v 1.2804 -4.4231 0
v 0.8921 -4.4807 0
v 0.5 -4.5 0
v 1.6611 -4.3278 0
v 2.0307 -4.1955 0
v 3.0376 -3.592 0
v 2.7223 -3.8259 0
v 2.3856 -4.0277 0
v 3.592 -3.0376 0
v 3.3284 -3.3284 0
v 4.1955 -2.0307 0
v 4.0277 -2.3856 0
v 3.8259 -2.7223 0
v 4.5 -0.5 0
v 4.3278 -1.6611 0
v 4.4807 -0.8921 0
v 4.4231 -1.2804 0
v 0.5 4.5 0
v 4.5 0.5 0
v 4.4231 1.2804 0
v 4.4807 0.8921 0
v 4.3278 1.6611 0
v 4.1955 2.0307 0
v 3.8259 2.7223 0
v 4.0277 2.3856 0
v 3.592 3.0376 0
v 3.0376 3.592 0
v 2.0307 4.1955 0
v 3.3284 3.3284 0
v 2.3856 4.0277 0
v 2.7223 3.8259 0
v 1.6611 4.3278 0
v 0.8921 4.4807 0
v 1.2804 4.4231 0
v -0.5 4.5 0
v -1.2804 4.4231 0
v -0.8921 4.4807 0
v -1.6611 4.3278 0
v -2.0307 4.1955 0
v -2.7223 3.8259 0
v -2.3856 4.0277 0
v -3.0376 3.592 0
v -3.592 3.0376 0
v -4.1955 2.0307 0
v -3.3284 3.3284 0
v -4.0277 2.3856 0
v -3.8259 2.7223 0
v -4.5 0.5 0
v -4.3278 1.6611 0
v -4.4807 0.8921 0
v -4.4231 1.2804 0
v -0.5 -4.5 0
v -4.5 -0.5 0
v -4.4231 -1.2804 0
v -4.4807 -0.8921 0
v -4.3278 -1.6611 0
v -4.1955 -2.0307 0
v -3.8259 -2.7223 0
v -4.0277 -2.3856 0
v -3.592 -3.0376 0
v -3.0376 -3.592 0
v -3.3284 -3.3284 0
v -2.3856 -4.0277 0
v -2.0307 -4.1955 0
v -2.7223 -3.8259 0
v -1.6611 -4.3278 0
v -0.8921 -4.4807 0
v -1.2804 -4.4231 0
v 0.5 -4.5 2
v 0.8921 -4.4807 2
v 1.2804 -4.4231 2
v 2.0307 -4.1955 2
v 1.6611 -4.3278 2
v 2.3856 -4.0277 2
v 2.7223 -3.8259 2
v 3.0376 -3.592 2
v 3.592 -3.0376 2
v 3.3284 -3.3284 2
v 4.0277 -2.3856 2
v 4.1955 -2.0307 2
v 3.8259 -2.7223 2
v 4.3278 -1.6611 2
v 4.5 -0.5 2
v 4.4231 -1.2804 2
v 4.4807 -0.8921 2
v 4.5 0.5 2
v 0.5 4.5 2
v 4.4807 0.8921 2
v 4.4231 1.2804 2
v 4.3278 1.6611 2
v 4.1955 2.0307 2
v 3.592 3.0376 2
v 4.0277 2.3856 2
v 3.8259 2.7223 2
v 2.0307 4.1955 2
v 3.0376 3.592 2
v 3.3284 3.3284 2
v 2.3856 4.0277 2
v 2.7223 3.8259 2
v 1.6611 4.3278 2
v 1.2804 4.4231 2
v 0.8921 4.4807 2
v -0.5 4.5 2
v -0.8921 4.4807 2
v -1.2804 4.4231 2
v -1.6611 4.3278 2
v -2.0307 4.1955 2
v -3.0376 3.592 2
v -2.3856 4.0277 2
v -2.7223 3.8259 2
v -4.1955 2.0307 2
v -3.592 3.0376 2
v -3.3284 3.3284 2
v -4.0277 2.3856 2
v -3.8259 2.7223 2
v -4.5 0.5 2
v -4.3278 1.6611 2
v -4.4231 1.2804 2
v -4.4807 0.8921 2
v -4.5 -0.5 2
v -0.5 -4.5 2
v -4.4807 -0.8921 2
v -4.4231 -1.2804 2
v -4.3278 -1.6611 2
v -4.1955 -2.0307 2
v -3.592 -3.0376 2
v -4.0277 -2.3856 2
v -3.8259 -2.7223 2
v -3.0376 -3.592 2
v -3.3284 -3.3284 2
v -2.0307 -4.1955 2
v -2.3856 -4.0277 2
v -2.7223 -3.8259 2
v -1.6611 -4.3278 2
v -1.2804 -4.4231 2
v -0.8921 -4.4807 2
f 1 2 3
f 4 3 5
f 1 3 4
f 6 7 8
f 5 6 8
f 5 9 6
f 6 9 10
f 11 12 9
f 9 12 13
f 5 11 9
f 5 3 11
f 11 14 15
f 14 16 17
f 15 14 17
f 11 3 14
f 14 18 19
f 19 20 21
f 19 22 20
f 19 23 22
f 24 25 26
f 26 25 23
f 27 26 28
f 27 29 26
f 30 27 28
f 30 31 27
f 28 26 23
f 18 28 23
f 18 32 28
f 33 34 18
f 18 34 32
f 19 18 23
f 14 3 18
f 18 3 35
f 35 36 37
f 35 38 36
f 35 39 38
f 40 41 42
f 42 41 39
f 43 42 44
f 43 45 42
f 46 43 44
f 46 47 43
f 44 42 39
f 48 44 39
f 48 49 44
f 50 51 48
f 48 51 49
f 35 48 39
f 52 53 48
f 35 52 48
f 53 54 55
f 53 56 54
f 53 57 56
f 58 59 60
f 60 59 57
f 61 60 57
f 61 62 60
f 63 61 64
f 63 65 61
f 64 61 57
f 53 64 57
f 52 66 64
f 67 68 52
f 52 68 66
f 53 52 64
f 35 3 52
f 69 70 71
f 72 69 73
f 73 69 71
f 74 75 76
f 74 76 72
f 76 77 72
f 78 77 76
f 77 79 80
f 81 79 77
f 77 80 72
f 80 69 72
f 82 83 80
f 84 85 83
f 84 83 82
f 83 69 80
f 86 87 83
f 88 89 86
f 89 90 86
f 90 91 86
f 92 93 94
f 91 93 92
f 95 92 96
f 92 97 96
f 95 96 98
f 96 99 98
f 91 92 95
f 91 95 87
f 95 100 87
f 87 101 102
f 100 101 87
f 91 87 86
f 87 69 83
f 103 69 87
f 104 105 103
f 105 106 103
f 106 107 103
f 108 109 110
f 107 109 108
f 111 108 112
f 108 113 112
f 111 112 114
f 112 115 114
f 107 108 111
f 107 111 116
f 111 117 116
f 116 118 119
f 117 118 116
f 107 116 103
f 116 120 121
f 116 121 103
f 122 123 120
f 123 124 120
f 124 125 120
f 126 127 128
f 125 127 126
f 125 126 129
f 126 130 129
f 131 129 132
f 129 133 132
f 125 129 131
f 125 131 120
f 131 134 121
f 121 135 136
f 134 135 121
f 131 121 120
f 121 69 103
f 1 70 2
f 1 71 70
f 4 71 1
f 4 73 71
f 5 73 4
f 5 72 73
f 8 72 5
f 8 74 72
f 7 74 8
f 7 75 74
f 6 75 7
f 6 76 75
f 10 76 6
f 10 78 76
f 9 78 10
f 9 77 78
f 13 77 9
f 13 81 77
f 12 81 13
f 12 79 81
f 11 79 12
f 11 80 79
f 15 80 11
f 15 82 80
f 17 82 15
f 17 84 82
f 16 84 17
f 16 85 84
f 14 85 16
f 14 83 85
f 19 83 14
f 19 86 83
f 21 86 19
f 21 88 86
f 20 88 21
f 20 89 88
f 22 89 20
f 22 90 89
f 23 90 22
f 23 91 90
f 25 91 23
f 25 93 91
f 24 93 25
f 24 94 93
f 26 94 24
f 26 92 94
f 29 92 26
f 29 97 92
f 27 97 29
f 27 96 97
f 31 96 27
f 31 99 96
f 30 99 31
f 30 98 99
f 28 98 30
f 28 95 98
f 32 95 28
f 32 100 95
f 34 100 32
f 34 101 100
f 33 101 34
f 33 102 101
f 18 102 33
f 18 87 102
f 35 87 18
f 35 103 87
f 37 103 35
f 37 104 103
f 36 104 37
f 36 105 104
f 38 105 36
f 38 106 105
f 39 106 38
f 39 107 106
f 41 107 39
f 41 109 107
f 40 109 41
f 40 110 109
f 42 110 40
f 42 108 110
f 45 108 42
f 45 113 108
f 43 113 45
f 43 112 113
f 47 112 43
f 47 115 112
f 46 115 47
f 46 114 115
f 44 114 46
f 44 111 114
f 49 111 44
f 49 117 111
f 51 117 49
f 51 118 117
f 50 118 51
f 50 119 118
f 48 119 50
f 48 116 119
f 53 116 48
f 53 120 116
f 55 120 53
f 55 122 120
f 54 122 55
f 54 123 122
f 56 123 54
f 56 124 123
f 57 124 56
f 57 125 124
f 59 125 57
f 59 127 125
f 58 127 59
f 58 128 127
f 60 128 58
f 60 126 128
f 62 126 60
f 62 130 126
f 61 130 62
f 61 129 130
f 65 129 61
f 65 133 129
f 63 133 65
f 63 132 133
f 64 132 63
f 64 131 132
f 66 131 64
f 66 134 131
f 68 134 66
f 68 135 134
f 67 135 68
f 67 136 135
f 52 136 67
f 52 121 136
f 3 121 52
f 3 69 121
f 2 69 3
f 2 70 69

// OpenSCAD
// file: lib/logo_plaque.scad
// Raised multi-color logo on a rounded base.
//
//   side view
//
//        ▄▄▄  ▒▒▒▒   ░░    ← logo layers, one per filament
//   ▐████████████████████▌ ← base
//
// Every layer SVG shares one pixel frame, so the layers line up without
// centering each one (centering would use each layer's own outline).

$fn = 64;

BASE_HEIGHT = 2;
LOGO_HEIGHT = 1.2;
BORDER = 3;
CORNER_RADIUS = 4;
AVATAR_FN = 180;
MARK_HEIGHT = 4;
TIE_HEIGHT = 1.2;

// potrace writes one point per pixel, and OpenSCAD reads points as 1/72 inch
MM_PER_FRAME_PX = 25.4 / 72;

module layer_2d(dir, name, frame, width) {
    scale(width / (frame.x * MM_PER_FRAME_PX))
        translate([-frame.x / 2, -frame.y / 2] * MM_PER_FRAME_PX)
            import(str(dir, "/", name, ".svg"));
}

// Earlier layers win where traced outlines overlap, so no two parts share volume.
module clipped_layer_2d(dir, layers, index, frame, width) {
    difference() {
        layer_2d(dir, layers[index][0], frame, width);

        for (earlier = [0:1:index - 1]) {
            layer_2d(dir, layers[earlier][0], frame, width);
        }
    }
}

module rounded_base_2d(frame, width, border, corner_radius) {
    height = width * frame.y / frame.x;

    offset(r = corner_radius)
        square(
            [
                width + (border - corner_radius) * 2,
                height + (border - corner_radius) * 2,
            ],
            center = true
        );
}

// `part` selects one filament for export: "base", a layer name, or "all".
// With `diameter`, the base is a circle instead of a rounded rectangle.
module logo_plaque(
    dir,
    frame,
    width,
    base_color,
    layers,
    part = "all",
    base_height = BASE_HEIGHT,
    logo_height = LOGO_HEIGHT,
    border = BORDER,
    corner_radius = CORNER_RADIUS,
    diameter = undef
) {
    if (part == "all" || part == "base") {
        color(base_color)
            linear_extrude(height = base_height)
                if (is_undef(diameter)) {
                    rounded_base_2d(frame, width, border, corner_radius);
                } else {
                    circle(d = diameter, $fn = AVATAR_FN);
                }
    }

    for (index = [0:1:len(layers) - 1]) {
        if (part == "all" || part == layers[index][0]) {
            color(layers[index][1])
                translate([0, 0, base_height])
                    linear_extrude(height = logo_height)
                        clipped_layer_2d(dir, layers, index, frame, width);
        }
    }
}

// The logo extruded with no base.
//
//   side view
//
//   ████  ████   ▒▒▒▒ ← layers at full height
//   ████▁▁████▁▁▁▒▒▒▒ ← low ties join loose pieces
//
// Each layer is [name, color, has_ties]. Ties are in "<name>_ties.svg", and stop
// at other layers so that no two parts share volume.
//
// With `back_color`, one more filament joins the pieces. The ties, in "ties.svg",
// and the logo's outline form a back layer, and the logo sits on top of it:
//
//   ████  ████   ▒▒▒▒
//   ▄▄▄▄▄▄▄▄▄▄▄▄▄▄▄▄▄ ← back layer, `tie_height` thick
//
// `part` selects one filament for export: "back", a layer name, or "all".
module logo_mark(
    dir,
    frame,
    width,
    layers,
    part = "all",
    height = MARK_HEIGHT,
    tie_height = TIE_HEIGHT,
    back_color = undef,
    back_has_ties = false
) {
    has_back = !is_undef(back_color);
    logo_z = has_back ? tie_height : 0;

    if (has_back && (part == "all" || part == "back")) {
        color(back_color)
            linear_extrude(height = tie_height) {
                for (layer = layers) {
                    layer_2d(dir, layer[0], frame, width);
                }

                if (back_has_ties) {
                    layer_2d(dir, "ties", frame, width);
                }
            }
    }

    for (index = [0:1:len(layers) - 1]) {
        name = layers[index][0];

        if (part == "all" || part == name) {
            color(layers[index][1]) {
                translate([0, 0, logo_z])
                    linear_extrude(height = height - logo_z)
                        clipped_layer_2d(dir, layers, index, frame, width);

                if (layers[index][2]) {
                    linear_extrude(height = tie_height)
                        difference() {
                            layer_2d(dir, str(name, "_ties"), frame, width);

                            for (other = layers) {
                                if (other[0] != name) {
                                    layer_2d(dir, other[0], frame, width);
                                }
                            }
                        }
                }
            }
        }
    }
}
// main file
use <lib/logo_plaque.scad>

logo_plaque("logos/ces_utility_solutions.svg", width = 80, base_style = "rect");
